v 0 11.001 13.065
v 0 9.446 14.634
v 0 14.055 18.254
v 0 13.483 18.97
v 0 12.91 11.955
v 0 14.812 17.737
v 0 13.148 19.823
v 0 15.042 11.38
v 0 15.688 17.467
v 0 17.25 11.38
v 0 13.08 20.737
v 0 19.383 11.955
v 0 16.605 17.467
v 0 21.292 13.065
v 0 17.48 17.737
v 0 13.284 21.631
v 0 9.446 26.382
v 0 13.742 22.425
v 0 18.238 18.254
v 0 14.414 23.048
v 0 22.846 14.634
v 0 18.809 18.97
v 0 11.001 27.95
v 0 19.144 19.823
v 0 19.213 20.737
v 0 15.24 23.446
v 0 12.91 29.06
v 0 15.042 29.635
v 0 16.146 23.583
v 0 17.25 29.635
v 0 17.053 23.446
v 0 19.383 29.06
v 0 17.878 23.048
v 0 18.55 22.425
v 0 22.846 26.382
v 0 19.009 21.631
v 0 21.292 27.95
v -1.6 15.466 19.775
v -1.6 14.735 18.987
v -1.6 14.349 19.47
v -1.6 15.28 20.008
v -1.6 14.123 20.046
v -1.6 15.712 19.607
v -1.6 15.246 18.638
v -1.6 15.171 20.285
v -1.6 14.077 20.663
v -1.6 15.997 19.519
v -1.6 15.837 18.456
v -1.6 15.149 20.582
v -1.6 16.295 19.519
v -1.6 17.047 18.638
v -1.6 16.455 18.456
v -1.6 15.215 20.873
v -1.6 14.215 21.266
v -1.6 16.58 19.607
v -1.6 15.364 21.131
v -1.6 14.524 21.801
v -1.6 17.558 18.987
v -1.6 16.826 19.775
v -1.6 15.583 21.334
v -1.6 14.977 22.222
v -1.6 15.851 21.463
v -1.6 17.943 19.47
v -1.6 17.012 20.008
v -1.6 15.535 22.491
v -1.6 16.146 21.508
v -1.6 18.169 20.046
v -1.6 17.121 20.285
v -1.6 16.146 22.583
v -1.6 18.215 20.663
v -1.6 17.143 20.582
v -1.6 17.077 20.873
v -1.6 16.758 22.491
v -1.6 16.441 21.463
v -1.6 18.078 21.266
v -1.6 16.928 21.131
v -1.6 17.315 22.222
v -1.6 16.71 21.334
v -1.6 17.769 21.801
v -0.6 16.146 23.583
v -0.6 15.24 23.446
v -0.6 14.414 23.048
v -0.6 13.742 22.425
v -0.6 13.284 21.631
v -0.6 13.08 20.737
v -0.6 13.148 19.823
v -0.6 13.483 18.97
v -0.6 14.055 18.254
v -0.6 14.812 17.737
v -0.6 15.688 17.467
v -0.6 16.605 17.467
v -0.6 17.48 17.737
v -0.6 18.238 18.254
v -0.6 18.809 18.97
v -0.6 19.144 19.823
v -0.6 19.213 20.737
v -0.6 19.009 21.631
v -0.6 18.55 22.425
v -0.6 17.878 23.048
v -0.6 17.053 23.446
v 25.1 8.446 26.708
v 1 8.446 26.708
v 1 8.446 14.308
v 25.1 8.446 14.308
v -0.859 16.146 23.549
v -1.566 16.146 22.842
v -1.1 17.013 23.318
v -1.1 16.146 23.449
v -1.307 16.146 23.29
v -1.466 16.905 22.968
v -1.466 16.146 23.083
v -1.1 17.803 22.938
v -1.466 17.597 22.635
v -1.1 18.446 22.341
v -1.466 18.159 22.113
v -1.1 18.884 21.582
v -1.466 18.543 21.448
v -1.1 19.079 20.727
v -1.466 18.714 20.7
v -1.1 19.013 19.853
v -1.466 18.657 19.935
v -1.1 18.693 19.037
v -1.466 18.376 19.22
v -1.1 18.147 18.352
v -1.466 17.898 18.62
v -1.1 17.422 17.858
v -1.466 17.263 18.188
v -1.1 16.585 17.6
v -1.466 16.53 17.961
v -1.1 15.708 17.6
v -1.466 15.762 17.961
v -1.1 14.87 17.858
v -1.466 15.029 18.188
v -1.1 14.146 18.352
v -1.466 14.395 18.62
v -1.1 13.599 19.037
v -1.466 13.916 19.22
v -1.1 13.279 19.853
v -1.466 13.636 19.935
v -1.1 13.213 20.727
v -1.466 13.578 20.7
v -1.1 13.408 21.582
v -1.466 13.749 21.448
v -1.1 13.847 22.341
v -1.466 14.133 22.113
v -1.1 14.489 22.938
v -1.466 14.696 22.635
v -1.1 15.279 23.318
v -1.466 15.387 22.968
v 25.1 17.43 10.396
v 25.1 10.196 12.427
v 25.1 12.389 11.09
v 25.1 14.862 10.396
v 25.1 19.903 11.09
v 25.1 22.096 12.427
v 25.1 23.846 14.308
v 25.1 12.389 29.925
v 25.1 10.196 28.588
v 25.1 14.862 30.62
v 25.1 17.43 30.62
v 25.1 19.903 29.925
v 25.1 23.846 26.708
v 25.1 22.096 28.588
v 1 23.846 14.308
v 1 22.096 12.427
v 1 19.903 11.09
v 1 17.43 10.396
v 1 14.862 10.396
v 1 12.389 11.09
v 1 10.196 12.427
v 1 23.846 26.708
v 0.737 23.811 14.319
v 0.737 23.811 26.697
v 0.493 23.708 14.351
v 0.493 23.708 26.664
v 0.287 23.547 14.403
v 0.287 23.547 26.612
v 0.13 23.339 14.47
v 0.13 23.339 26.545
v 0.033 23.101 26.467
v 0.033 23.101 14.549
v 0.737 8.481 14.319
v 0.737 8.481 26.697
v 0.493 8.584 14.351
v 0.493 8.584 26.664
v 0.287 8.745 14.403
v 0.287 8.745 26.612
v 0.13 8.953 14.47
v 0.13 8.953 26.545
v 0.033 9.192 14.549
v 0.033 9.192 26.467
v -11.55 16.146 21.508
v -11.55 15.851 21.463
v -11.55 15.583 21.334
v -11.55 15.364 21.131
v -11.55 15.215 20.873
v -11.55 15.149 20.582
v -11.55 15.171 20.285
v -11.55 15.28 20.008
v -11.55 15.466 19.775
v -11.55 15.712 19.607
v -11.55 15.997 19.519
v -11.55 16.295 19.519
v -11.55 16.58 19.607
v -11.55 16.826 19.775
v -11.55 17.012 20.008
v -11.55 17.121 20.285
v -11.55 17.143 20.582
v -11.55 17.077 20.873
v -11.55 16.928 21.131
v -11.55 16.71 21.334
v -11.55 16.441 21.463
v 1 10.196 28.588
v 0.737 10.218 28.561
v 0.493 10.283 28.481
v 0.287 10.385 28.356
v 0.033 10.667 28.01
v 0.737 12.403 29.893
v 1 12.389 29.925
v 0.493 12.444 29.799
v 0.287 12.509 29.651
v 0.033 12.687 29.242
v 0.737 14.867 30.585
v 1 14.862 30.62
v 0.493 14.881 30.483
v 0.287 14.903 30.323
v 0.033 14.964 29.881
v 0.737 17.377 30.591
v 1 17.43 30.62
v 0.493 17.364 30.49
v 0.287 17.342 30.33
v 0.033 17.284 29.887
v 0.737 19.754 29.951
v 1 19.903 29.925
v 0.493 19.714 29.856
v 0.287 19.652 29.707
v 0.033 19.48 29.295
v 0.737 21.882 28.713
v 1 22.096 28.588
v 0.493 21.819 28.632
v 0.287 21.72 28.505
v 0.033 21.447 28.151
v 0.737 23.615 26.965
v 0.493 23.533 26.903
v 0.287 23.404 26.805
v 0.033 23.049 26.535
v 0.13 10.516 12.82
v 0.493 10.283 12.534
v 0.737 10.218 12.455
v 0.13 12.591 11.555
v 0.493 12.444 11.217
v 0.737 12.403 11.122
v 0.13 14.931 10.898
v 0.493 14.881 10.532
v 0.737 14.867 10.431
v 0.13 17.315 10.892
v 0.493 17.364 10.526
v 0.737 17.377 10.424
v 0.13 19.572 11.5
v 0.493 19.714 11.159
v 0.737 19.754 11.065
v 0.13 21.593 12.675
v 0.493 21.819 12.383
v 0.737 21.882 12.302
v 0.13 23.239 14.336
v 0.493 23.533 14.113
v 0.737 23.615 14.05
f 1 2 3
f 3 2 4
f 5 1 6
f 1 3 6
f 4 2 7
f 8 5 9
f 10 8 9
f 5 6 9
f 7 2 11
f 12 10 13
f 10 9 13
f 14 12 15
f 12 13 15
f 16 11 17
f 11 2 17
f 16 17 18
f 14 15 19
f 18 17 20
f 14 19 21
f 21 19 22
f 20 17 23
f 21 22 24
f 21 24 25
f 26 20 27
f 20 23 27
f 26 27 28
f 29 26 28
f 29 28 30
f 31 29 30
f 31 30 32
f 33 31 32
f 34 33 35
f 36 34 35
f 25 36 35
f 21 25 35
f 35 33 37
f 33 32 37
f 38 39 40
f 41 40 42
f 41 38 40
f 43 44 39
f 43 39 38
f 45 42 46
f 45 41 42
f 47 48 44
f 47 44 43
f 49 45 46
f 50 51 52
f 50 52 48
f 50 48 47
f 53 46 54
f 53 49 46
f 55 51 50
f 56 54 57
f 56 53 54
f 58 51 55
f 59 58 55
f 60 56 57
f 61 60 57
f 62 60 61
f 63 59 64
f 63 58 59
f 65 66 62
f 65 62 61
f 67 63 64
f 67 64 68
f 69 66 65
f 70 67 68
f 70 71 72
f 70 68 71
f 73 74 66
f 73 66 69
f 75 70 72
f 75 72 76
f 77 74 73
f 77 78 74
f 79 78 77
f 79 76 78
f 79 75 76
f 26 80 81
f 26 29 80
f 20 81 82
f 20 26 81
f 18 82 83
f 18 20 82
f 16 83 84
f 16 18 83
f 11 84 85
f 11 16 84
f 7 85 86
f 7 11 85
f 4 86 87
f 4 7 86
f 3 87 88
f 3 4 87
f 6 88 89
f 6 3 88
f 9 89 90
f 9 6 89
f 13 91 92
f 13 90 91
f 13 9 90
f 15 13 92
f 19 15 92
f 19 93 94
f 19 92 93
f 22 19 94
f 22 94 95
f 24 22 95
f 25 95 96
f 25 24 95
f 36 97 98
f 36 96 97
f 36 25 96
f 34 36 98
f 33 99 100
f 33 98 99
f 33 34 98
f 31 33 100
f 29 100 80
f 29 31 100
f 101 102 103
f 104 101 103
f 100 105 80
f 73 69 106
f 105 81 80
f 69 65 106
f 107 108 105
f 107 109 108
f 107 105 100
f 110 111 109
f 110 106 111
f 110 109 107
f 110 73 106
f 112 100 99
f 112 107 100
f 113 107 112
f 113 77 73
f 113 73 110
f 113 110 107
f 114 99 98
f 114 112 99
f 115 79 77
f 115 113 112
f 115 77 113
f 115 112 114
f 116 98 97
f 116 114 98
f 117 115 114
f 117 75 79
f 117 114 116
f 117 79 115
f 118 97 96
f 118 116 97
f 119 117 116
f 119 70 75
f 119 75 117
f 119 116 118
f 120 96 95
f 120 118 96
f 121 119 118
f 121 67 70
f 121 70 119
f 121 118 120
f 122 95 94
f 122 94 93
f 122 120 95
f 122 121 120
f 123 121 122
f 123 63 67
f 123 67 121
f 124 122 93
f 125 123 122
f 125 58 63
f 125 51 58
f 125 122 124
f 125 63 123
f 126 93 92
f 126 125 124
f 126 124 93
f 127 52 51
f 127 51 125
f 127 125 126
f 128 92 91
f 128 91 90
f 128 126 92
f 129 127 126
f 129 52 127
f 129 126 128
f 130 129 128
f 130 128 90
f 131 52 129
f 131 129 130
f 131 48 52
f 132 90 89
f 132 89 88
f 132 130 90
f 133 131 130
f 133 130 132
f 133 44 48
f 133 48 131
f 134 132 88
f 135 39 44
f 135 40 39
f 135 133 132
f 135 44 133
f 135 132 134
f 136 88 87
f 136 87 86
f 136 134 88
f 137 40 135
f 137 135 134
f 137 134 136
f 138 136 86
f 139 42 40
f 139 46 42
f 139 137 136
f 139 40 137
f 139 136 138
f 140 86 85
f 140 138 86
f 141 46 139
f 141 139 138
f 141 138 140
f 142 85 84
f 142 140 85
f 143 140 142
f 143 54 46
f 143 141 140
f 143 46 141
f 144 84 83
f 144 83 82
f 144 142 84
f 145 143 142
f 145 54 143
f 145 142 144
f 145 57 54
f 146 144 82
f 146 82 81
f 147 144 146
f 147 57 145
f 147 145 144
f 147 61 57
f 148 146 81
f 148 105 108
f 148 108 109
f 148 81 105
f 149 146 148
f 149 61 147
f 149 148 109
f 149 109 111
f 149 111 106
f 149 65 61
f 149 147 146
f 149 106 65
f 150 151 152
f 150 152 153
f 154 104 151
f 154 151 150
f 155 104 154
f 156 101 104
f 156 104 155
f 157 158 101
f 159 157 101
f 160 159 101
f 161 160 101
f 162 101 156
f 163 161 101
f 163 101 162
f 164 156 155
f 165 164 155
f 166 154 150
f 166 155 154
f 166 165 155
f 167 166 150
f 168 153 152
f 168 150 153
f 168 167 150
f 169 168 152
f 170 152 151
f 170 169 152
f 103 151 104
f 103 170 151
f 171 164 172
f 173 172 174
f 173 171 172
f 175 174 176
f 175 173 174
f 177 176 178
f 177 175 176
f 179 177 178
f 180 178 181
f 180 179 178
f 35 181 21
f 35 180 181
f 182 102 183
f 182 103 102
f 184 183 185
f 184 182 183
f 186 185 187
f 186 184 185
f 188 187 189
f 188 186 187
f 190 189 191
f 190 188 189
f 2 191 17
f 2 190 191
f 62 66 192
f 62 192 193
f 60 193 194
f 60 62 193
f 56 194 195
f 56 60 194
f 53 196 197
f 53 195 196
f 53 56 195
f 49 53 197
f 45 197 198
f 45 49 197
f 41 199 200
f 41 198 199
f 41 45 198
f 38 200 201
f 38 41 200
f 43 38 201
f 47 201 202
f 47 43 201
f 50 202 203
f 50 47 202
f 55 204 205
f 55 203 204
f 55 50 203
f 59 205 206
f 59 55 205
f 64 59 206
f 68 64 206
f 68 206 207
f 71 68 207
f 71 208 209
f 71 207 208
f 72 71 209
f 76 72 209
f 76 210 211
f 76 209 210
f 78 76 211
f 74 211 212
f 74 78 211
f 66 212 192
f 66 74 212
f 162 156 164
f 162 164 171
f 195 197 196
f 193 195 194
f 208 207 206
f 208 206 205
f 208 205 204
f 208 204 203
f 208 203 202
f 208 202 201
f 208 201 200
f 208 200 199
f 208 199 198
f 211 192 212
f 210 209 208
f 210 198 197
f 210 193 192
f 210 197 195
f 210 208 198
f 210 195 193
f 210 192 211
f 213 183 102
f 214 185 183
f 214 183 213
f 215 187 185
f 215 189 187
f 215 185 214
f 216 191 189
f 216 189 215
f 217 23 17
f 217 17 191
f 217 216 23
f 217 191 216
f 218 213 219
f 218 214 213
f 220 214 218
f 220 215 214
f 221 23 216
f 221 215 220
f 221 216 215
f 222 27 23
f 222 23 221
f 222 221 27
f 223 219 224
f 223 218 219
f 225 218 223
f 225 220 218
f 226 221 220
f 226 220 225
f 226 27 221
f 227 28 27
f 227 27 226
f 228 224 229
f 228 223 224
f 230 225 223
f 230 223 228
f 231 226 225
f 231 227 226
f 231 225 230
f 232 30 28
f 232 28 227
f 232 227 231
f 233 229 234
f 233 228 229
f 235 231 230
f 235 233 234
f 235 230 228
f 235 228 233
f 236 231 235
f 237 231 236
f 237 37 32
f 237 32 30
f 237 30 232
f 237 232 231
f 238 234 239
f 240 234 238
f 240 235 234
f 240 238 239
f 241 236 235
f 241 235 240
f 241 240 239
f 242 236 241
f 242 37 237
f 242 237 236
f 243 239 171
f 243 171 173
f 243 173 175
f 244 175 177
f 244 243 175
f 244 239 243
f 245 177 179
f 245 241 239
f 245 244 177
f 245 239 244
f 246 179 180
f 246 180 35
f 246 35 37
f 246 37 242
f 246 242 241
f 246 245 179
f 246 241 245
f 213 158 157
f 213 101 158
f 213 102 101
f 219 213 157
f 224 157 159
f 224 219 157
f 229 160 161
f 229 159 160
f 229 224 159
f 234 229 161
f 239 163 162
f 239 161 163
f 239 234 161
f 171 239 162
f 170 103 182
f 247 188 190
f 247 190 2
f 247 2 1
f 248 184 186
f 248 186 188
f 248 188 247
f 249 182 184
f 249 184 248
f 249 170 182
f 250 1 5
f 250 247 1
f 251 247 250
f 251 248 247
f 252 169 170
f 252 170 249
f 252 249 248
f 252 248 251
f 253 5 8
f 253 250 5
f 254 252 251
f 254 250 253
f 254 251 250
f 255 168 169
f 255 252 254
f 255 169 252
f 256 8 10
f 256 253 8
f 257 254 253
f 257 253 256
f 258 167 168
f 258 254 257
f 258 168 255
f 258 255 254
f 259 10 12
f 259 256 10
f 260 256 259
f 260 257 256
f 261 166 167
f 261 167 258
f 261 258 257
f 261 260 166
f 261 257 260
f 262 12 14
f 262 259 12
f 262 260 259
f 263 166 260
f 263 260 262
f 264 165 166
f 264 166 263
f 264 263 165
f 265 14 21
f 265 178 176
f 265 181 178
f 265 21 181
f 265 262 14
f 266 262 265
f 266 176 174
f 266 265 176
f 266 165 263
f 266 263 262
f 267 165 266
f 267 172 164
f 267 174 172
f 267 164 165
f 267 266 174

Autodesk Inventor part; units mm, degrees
ref_plane "YZ Plane" through (0, 0, 0) normal (1, 0, 0) x (0, 1, 0)
ref_plane "XZ Plane" through (0, 0, 0) normal (0, 1, 0) x (-1, 0, 0)
ref_plane "XY Plane" through (0, 0, 0) normal (0, 0, 1) x (1, 0, 0)
sketch "Sketch3" plane through (0, 0, 0) normal (1, 0, 0) x (0, 1, 0)
  line L0 (23.8462, 26.7077) -> (8.4462, 26.7077) construction
  line L1 (8.4462, 26.7077) -> (8.4462, 14.3077)
  line L2 (8.4462, 14.3077) -> (23.8462, 14.3077) construction
  line L3 (23.8462, 14.3077) -> (23.8462, 26.7077)
  line L4 (16.1462, 26.7077) -> (16.1462, 30.7077) construction
  line L5 (16.1462, 14.3077) -> (16.1462, 10.3077) construction
  arc A0 (8.4462, 14.3077) -> (23.8462, 14.3077) centre (16.1462, 19.7189) ccw
  arc A1 (23.8462, 26.7077) -> (8.4462, 26.7077) centre (16.1462, 21.2964) ccw
  point P0 (0, 0)
  dimension "d9" = 12.4
  dimension "d10" = 15.4
  dimension "d11" = 4
  dimension "d12" = 4
  dimension "d13" = 20.4
extrude "Extrusion1" add sketch "Sketch3" along normal blind 25.1
sketch "Sketch4" plane through (0, 0, 0) normal (-1, 0, 0) x (0, 0, 1)
  line L0 (26.7077, 8.4462) -> (14.3077, 8.4462) projected
  line L1 (14.3077, 23.8462) -> (26.7077, 23.8462) projected
  arc A0 (14.3077, 23.8462) -> (14.3077, 8.4462) centre (19.7189, 16.1462) ccw projected
  arc A1 (26.7077, 8.4462) -> (26.7077, 23.8462) centre (21.2964, 16.1462) ccw projected
  circle A2 centre (20.5077, 16.1462) radius 3.075
  point P0 (0, 0)
  dimension "d16" = 6.15
extrude "Extrusion2" add sketch "Sketch4" along normal blind 1.6 contours A2
sketch "Sketch5" plane through (-1.6, 16.1462, 20.5077) normal (-1, 0, 0) x (0, 0, 1)
  circle A0 centre (0, 0) radius 1
  point P0 (-20.5077, -16.1462)
  dimension "d19" = 2
extrude "Extrusion3" add sketch "Sketch5" along normal blind 9.95
fillet "Fillet3" radius 1 5 edges at (-1.6, 16.1462, 17.4327) (0, 23.8462, 20.5077) (0, 16.1462, 30.7077) (0, 8.4462, 20.5077) (0, 16.1462, 10.3077)
properties part number "Motor" material "Iron, Cast"
